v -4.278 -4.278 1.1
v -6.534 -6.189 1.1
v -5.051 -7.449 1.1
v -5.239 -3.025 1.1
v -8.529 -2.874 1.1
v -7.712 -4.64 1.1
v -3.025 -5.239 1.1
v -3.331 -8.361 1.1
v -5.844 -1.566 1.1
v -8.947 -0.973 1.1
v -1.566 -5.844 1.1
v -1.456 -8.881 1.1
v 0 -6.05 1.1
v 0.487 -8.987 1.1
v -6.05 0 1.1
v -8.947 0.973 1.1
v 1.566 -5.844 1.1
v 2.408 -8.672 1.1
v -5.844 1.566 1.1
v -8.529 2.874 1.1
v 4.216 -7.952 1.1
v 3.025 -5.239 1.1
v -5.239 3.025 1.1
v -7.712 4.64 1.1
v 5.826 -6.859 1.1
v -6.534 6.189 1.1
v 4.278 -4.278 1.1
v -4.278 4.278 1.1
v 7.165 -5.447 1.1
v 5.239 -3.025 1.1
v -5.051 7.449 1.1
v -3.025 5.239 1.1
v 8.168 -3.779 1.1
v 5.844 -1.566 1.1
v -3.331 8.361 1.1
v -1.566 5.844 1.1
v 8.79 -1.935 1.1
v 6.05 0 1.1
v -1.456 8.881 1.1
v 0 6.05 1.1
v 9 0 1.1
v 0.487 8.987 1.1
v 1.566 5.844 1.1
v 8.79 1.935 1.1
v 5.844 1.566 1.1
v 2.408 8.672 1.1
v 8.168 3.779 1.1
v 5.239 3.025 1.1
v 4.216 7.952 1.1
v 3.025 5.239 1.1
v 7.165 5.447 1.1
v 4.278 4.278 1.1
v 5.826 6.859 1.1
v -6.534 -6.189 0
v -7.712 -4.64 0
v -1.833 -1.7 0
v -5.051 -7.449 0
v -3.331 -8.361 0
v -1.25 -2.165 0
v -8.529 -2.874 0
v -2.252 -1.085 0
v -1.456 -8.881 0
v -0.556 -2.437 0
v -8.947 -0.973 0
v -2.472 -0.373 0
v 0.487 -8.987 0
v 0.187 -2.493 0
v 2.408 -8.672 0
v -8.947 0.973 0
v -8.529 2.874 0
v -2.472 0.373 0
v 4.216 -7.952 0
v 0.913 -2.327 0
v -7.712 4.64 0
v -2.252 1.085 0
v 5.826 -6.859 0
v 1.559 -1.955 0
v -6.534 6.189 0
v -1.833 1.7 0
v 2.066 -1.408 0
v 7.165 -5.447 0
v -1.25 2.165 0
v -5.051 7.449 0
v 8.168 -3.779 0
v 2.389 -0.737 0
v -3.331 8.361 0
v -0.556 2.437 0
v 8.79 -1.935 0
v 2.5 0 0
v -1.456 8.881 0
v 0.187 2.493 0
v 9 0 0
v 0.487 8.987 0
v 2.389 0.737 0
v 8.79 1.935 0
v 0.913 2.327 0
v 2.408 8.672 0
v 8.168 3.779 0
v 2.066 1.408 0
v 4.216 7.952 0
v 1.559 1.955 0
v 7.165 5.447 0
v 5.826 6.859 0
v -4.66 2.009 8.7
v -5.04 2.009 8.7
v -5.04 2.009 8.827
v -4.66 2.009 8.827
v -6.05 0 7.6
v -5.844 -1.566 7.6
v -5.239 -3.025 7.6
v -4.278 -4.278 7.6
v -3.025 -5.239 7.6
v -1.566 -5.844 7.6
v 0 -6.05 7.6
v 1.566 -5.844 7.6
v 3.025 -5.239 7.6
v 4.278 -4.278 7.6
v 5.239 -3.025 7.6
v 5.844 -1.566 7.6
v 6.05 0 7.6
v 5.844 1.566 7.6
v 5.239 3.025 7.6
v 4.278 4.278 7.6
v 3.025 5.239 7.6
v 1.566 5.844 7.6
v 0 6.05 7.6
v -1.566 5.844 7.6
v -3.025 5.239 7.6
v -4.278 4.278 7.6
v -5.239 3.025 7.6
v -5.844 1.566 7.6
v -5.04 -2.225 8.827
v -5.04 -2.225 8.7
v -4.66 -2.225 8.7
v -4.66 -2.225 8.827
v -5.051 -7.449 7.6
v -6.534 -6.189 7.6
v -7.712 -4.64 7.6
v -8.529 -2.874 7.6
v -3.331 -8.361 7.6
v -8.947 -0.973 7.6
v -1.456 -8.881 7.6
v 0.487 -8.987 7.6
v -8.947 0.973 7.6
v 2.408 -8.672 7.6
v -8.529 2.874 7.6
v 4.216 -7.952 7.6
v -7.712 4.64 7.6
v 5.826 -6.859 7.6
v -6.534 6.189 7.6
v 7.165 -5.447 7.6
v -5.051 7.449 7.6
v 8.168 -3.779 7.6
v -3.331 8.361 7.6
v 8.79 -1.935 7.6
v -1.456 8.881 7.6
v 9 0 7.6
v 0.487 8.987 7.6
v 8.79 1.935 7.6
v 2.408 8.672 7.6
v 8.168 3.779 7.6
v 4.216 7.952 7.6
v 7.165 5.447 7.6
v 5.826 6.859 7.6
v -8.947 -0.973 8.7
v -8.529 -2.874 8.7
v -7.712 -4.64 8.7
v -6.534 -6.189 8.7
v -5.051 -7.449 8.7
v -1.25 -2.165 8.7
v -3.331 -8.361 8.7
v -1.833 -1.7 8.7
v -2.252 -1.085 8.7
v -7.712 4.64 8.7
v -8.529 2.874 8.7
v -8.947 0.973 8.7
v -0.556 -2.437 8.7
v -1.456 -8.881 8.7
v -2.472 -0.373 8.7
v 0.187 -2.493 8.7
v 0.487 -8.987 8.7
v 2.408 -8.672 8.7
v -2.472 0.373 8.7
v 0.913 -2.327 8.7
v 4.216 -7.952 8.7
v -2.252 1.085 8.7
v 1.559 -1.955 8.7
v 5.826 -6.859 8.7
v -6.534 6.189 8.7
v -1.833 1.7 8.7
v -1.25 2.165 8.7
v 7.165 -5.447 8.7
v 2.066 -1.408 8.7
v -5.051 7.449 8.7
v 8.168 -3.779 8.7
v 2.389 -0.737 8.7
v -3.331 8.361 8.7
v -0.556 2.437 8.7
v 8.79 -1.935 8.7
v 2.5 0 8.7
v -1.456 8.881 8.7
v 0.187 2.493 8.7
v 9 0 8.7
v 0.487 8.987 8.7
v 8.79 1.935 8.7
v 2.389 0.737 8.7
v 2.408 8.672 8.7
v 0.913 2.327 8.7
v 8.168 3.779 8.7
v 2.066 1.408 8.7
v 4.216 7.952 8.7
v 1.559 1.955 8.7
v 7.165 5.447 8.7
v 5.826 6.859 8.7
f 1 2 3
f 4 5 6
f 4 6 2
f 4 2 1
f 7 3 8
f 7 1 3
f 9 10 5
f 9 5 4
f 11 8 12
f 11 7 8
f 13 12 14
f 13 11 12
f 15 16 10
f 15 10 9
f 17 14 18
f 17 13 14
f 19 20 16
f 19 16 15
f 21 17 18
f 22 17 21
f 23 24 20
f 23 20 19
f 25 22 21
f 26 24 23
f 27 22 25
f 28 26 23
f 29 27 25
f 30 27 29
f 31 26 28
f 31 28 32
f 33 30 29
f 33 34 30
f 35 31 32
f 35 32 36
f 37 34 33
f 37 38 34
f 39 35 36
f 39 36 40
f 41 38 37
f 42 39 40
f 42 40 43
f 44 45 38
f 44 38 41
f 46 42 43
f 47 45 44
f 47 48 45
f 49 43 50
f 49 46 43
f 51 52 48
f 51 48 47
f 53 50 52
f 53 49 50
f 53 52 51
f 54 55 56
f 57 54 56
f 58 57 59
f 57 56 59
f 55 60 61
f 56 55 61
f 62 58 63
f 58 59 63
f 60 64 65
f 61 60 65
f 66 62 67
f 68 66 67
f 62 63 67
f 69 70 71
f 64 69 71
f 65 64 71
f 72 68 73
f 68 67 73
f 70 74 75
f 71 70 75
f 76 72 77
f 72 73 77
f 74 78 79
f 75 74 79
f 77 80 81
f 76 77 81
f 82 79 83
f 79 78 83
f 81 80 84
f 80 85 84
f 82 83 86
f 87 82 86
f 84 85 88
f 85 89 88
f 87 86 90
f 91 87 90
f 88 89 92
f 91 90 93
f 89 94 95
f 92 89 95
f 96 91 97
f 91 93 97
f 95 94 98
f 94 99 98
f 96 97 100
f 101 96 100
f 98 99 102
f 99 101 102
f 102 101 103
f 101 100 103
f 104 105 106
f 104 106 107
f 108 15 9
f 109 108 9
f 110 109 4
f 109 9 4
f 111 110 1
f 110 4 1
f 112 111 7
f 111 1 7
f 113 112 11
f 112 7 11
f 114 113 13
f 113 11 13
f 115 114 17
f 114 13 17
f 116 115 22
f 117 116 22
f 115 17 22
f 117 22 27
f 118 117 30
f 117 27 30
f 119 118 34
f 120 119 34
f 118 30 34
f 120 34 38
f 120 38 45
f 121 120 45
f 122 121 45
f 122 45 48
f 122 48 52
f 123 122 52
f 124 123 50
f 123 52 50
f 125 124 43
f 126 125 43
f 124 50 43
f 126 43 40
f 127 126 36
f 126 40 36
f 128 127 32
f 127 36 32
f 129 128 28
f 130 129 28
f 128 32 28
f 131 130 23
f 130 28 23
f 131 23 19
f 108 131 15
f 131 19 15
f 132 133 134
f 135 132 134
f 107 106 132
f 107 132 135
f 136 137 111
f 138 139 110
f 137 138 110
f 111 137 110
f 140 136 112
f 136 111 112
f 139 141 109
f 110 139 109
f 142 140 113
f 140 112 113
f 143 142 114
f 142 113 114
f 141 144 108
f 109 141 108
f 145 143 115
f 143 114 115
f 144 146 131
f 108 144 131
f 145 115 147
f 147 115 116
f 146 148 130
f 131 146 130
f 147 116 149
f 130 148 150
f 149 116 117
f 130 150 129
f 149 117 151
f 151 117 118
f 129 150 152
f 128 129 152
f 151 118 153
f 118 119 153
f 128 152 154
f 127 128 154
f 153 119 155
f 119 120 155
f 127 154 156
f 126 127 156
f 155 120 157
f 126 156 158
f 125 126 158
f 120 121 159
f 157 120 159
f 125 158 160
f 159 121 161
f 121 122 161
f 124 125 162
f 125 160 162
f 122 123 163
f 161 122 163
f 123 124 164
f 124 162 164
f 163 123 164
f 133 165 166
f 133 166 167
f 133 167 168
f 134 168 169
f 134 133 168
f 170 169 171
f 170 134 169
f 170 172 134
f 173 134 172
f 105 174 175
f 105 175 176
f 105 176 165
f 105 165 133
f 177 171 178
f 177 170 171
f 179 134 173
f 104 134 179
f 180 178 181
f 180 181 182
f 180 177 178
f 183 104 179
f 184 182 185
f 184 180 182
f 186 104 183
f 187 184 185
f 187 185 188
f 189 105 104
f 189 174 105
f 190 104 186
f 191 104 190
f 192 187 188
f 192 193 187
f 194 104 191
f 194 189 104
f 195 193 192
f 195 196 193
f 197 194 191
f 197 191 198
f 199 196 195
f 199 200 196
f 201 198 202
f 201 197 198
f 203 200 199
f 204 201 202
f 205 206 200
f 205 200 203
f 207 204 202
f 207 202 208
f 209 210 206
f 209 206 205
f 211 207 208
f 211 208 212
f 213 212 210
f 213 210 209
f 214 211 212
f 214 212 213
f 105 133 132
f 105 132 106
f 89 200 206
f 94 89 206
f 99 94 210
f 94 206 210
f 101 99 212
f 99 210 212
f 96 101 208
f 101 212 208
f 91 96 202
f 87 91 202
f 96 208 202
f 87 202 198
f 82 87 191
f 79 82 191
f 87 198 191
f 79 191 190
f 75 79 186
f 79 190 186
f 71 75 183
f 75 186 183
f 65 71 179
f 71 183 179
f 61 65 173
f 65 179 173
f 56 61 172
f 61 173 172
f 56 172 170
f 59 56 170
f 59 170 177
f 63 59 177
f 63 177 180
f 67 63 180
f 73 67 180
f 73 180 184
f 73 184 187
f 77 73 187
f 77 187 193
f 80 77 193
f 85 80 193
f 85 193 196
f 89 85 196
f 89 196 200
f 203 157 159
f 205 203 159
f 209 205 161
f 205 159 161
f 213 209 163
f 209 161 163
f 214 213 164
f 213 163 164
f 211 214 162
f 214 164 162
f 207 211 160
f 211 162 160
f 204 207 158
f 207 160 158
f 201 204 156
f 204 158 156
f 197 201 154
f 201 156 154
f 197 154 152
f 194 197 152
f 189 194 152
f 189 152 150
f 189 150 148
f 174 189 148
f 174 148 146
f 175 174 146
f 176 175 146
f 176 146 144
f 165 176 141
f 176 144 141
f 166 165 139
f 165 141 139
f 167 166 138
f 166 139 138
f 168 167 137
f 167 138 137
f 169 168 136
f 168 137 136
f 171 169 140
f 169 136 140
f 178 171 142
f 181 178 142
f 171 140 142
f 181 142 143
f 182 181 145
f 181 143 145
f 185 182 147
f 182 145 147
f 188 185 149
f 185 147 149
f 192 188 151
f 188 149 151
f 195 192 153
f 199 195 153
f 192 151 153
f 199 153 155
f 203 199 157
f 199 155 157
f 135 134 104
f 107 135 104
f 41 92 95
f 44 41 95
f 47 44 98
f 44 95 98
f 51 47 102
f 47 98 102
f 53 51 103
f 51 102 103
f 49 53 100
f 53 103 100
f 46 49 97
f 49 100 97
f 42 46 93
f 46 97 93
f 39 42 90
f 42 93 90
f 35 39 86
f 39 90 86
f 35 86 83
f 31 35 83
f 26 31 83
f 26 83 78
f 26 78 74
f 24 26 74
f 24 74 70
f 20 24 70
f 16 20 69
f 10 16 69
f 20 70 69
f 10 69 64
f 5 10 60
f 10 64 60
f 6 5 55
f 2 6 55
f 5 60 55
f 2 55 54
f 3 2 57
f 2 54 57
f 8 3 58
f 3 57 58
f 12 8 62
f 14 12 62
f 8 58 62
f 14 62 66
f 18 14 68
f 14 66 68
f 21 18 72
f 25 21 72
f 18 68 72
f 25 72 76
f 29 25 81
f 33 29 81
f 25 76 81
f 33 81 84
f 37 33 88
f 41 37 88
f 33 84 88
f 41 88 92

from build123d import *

# Parameters (mm, degrees)
SKETCH1_R           = 9
BOSS_EXTRUDE1_DEPTH = 1.1
SKETCH2_R           = 6.05
BOSS_EXTRUDE2_DEPTH = 6.5
SKETCH3_R           = 9
BOSS_EXTRUDE3_DEPTH = 1.1
CUT_EXTRUDE1_REACH  = 17.417
SKETCH4_R           = 2.5
SKETCH5_W           = 0.37991453
SKETCH5_H           = 4.233333334
BOSS_EXTRUDE4_DEPTH = 0.127


with BuildPart() as part:
    # Sketch1 → Boss-Extrude1 (new body)
    with BuildSketch(Plane.XY):
        Circle(SKETCH1_R)
    extrude(amount=BOSS_EXTRUDE1_DEPTH)

    # Sketch2 → Boss-Extrude2 (add)
    with BuildSketch(Plane.XY.offset(1.1)):
        with Locations(Location((0, 0, 0), (0, 0, 180))):
            Circle(SKETCH2_R)
    extrude(amount=BOSS_EXTRUDE2_DEPTH)

    # Sketch3 → Boss-Extrude3 (add)
    with BuildSketch(Plane.XY.offset(7.6)):
        Circle(SKETCH3_R)
    extrude(amount=BOSS_EXTRUDE3_DEPTH)

    # Sketch4 → Cut-Extrude1 (cut, up to next)
    with BuildSketch(Plane.XY.offset(8.7), mode=Mode.PRIVATE) as cut_extrude1_sk1:
        Circle(SKETCH4_R)
    cut_extrude1_tool1 = extrude(cut_extrude1_sk1.sketch, amount=-CUT_EXTRUDE1_REACH, mode=Mode.PRIVATE) & part.part
    add(cut_extrude1_tool1.solids().sort_by_distance((0, 0, 8.7))[0], mode=Mode.SUBTRACT)

    # Sketch5 → Boss-Extrude4 (add)
    with BuildSketch(Plane.XY.offset(8.7)):
        with Locations((-4.850266592, -0.107968693)):
            Rectangle(SKETCH5_W, SKETCH5_H)
    extrude(amount=BOSS_EXTRUDE4_DEPTH)


solid = part.part
